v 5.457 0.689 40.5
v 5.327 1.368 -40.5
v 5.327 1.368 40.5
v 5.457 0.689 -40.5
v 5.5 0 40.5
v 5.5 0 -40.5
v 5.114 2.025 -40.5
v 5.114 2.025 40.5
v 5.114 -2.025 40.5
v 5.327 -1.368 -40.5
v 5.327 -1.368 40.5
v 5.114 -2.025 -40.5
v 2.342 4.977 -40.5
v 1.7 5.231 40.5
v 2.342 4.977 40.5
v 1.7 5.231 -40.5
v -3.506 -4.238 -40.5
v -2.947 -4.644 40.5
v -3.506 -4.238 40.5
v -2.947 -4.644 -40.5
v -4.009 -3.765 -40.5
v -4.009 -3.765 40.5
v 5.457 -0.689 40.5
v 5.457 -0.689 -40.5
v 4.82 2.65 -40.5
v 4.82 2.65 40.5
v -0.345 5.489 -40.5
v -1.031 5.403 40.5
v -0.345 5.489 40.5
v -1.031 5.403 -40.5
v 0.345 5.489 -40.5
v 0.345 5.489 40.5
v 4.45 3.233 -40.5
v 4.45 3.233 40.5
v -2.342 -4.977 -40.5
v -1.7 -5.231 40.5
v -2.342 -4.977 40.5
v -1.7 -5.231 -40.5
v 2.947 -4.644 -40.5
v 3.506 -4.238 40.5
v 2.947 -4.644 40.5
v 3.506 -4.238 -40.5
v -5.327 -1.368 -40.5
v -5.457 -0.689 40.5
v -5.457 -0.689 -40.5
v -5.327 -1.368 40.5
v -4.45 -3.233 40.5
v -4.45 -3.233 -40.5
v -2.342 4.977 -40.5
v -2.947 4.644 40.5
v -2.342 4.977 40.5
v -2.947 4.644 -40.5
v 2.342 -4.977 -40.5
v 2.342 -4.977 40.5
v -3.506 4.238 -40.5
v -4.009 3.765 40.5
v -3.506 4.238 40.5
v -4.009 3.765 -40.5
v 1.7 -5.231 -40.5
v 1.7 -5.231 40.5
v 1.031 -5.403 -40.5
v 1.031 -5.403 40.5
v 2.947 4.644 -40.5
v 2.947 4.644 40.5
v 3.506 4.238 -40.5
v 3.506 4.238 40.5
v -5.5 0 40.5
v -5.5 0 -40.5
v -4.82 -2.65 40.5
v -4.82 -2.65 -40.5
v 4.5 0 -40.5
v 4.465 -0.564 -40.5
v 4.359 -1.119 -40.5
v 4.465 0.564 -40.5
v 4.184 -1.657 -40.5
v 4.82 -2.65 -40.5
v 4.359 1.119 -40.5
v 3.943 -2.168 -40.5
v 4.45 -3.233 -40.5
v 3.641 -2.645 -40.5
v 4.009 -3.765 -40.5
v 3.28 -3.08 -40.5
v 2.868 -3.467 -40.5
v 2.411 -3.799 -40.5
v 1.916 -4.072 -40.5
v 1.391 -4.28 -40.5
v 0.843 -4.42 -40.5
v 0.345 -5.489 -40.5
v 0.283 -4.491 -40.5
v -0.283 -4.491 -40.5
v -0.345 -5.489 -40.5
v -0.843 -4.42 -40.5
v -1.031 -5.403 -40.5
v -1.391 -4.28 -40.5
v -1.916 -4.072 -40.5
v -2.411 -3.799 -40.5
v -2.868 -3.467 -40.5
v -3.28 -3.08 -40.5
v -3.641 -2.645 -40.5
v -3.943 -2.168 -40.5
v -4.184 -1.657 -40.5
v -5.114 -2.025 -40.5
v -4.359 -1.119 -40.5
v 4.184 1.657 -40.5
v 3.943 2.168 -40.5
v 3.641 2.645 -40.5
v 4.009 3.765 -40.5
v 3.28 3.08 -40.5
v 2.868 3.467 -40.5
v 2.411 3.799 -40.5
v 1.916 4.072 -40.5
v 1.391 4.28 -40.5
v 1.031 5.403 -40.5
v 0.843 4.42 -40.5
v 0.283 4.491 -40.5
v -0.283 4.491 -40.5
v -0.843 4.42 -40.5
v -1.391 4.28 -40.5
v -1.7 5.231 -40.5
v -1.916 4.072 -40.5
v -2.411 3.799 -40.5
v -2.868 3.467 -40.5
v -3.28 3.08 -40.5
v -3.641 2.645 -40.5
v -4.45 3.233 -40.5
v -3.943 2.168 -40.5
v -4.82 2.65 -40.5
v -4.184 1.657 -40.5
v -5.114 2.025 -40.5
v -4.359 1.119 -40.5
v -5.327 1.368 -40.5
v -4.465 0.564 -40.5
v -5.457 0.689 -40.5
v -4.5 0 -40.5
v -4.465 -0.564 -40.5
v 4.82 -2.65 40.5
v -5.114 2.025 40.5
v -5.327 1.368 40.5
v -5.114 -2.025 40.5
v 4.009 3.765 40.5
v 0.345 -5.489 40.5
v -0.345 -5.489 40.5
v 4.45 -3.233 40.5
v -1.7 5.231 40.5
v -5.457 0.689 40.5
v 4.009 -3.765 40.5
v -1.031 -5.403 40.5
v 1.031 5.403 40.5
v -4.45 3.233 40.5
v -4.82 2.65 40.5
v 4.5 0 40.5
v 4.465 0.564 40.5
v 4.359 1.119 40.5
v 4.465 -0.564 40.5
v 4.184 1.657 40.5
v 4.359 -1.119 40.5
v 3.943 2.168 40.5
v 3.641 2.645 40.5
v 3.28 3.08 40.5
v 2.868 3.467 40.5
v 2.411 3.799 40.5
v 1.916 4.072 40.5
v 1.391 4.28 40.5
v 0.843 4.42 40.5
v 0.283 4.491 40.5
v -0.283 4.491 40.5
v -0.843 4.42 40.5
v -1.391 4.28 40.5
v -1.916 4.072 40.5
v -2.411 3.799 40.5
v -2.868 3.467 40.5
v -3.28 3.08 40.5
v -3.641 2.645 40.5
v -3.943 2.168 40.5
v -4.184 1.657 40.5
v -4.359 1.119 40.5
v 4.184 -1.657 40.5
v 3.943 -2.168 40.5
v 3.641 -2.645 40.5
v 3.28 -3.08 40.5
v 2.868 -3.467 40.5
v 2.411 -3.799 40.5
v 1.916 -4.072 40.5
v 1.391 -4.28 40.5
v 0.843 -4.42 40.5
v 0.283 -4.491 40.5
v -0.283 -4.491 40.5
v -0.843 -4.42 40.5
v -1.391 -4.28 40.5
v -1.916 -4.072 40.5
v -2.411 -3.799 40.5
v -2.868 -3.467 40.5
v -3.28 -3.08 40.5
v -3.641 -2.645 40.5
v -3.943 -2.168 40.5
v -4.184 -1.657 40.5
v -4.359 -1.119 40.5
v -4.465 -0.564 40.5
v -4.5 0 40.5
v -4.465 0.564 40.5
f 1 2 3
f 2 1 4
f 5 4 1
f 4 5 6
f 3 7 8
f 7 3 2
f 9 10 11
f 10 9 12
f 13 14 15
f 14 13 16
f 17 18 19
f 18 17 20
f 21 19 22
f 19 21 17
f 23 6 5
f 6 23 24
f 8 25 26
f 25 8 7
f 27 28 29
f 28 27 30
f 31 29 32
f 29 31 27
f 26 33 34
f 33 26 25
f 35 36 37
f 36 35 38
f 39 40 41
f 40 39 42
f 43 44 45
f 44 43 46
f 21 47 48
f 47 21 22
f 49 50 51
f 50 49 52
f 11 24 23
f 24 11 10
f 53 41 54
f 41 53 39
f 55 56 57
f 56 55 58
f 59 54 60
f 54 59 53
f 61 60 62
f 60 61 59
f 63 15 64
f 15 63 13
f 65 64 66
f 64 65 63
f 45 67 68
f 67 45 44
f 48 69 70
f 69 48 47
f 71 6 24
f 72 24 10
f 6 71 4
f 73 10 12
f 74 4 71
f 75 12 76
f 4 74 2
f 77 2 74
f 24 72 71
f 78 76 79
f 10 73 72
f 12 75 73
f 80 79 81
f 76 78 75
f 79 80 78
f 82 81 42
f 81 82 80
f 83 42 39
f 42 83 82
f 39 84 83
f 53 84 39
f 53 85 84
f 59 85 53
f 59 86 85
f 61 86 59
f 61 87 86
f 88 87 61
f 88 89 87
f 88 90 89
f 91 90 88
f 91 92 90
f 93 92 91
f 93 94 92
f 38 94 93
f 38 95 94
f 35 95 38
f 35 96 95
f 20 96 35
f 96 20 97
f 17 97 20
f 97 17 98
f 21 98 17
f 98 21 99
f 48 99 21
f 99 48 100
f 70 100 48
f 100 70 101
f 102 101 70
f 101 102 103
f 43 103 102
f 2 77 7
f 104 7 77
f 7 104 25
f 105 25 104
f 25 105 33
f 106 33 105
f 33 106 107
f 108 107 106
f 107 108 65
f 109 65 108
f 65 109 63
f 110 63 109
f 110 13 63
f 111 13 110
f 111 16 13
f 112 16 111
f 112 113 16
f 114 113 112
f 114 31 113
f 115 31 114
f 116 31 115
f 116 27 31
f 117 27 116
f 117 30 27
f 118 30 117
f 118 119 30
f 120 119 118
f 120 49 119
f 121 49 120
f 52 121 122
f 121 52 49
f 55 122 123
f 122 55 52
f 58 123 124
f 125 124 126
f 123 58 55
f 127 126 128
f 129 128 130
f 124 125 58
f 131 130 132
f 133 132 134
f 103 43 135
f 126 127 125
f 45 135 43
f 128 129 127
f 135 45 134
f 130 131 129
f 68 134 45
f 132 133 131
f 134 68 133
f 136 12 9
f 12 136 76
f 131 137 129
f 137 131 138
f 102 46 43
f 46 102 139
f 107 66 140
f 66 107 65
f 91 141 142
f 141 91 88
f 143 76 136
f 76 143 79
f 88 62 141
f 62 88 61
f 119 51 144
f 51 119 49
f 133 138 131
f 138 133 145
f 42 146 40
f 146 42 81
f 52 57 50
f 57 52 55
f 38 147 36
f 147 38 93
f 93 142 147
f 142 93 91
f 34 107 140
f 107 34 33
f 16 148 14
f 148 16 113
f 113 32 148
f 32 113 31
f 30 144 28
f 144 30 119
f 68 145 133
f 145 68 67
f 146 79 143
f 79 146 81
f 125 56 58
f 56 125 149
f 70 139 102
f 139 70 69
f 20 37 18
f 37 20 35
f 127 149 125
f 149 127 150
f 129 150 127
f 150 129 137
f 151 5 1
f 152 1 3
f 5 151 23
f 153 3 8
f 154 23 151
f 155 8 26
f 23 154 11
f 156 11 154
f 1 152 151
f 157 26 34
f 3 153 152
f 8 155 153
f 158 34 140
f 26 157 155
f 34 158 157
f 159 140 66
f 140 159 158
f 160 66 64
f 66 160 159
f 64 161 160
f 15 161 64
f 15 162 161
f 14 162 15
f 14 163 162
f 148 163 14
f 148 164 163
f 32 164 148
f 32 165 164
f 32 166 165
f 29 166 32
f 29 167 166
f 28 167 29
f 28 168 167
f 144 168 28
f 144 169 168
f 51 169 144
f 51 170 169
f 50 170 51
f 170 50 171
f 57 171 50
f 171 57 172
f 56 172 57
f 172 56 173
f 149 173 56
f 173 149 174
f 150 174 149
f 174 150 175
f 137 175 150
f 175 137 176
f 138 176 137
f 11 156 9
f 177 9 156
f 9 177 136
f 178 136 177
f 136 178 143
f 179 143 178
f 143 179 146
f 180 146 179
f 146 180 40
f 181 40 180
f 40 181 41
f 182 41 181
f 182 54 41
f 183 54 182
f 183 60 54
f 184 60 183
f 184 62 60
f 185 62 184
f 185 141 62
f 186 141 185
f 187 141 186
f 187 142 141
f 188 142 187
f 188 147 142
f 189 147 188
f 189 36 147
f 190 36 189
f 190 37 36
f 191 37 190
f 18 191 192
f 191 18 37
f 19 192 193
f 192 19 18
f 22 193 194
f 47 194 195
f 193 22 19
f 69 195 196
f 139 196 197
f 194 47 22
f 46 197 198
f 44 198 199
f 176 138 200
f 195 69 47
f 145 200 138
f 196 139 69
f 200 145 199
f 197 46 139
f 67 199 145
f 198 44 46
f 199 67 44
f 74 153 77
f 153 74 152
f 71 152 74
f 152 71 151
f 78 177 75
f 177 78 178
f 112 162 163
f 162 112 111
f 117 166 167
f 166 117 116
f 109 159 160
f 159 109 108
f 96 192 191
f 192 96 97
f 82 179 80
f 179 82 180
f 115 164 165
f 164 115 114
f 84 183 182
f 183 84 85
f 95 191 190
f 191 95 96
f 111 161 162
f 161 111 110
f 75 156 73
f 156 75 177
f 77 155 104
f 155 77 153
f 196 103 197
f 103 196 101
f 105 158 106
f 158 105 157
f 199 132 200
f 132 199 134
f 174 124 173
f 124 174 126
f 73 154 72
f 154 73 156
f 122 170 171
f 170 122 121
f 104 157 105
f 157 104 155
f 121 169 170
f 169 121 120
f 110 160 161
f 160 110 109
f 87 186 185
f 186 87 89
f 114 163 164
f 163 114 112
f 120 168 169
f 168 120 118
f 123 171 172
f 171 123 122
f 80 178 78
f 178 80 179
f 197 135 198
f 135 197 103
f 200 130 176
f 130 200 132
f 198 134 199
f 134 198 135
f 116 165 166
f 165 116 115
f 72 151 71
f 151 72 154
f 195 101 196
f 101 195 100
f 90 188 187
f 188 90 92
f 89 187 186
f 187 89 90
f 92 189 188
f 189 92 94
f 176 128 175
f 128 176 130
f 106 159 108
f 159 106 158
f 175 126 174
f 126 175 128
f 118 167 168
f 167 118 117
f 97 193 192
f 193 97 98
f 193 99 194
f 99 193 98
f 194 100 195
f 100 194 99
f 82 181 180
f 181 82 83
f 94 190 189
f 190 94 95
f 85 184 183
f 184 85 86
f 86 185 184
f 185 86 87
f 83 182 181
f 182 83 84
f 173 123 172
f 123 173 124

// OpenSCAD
$fn = 50;


difference() {
	union() {
		translate(v = [0, 0, -40.5000000000]) {
			cylinder(h = 81, r = 5.5000000000);
		}
	}
	union() {
		translate(v = [0, 0, -100.0000000000]) {
			cylinder(h = 200, r = 4.5000000000);
		}
	}
}
